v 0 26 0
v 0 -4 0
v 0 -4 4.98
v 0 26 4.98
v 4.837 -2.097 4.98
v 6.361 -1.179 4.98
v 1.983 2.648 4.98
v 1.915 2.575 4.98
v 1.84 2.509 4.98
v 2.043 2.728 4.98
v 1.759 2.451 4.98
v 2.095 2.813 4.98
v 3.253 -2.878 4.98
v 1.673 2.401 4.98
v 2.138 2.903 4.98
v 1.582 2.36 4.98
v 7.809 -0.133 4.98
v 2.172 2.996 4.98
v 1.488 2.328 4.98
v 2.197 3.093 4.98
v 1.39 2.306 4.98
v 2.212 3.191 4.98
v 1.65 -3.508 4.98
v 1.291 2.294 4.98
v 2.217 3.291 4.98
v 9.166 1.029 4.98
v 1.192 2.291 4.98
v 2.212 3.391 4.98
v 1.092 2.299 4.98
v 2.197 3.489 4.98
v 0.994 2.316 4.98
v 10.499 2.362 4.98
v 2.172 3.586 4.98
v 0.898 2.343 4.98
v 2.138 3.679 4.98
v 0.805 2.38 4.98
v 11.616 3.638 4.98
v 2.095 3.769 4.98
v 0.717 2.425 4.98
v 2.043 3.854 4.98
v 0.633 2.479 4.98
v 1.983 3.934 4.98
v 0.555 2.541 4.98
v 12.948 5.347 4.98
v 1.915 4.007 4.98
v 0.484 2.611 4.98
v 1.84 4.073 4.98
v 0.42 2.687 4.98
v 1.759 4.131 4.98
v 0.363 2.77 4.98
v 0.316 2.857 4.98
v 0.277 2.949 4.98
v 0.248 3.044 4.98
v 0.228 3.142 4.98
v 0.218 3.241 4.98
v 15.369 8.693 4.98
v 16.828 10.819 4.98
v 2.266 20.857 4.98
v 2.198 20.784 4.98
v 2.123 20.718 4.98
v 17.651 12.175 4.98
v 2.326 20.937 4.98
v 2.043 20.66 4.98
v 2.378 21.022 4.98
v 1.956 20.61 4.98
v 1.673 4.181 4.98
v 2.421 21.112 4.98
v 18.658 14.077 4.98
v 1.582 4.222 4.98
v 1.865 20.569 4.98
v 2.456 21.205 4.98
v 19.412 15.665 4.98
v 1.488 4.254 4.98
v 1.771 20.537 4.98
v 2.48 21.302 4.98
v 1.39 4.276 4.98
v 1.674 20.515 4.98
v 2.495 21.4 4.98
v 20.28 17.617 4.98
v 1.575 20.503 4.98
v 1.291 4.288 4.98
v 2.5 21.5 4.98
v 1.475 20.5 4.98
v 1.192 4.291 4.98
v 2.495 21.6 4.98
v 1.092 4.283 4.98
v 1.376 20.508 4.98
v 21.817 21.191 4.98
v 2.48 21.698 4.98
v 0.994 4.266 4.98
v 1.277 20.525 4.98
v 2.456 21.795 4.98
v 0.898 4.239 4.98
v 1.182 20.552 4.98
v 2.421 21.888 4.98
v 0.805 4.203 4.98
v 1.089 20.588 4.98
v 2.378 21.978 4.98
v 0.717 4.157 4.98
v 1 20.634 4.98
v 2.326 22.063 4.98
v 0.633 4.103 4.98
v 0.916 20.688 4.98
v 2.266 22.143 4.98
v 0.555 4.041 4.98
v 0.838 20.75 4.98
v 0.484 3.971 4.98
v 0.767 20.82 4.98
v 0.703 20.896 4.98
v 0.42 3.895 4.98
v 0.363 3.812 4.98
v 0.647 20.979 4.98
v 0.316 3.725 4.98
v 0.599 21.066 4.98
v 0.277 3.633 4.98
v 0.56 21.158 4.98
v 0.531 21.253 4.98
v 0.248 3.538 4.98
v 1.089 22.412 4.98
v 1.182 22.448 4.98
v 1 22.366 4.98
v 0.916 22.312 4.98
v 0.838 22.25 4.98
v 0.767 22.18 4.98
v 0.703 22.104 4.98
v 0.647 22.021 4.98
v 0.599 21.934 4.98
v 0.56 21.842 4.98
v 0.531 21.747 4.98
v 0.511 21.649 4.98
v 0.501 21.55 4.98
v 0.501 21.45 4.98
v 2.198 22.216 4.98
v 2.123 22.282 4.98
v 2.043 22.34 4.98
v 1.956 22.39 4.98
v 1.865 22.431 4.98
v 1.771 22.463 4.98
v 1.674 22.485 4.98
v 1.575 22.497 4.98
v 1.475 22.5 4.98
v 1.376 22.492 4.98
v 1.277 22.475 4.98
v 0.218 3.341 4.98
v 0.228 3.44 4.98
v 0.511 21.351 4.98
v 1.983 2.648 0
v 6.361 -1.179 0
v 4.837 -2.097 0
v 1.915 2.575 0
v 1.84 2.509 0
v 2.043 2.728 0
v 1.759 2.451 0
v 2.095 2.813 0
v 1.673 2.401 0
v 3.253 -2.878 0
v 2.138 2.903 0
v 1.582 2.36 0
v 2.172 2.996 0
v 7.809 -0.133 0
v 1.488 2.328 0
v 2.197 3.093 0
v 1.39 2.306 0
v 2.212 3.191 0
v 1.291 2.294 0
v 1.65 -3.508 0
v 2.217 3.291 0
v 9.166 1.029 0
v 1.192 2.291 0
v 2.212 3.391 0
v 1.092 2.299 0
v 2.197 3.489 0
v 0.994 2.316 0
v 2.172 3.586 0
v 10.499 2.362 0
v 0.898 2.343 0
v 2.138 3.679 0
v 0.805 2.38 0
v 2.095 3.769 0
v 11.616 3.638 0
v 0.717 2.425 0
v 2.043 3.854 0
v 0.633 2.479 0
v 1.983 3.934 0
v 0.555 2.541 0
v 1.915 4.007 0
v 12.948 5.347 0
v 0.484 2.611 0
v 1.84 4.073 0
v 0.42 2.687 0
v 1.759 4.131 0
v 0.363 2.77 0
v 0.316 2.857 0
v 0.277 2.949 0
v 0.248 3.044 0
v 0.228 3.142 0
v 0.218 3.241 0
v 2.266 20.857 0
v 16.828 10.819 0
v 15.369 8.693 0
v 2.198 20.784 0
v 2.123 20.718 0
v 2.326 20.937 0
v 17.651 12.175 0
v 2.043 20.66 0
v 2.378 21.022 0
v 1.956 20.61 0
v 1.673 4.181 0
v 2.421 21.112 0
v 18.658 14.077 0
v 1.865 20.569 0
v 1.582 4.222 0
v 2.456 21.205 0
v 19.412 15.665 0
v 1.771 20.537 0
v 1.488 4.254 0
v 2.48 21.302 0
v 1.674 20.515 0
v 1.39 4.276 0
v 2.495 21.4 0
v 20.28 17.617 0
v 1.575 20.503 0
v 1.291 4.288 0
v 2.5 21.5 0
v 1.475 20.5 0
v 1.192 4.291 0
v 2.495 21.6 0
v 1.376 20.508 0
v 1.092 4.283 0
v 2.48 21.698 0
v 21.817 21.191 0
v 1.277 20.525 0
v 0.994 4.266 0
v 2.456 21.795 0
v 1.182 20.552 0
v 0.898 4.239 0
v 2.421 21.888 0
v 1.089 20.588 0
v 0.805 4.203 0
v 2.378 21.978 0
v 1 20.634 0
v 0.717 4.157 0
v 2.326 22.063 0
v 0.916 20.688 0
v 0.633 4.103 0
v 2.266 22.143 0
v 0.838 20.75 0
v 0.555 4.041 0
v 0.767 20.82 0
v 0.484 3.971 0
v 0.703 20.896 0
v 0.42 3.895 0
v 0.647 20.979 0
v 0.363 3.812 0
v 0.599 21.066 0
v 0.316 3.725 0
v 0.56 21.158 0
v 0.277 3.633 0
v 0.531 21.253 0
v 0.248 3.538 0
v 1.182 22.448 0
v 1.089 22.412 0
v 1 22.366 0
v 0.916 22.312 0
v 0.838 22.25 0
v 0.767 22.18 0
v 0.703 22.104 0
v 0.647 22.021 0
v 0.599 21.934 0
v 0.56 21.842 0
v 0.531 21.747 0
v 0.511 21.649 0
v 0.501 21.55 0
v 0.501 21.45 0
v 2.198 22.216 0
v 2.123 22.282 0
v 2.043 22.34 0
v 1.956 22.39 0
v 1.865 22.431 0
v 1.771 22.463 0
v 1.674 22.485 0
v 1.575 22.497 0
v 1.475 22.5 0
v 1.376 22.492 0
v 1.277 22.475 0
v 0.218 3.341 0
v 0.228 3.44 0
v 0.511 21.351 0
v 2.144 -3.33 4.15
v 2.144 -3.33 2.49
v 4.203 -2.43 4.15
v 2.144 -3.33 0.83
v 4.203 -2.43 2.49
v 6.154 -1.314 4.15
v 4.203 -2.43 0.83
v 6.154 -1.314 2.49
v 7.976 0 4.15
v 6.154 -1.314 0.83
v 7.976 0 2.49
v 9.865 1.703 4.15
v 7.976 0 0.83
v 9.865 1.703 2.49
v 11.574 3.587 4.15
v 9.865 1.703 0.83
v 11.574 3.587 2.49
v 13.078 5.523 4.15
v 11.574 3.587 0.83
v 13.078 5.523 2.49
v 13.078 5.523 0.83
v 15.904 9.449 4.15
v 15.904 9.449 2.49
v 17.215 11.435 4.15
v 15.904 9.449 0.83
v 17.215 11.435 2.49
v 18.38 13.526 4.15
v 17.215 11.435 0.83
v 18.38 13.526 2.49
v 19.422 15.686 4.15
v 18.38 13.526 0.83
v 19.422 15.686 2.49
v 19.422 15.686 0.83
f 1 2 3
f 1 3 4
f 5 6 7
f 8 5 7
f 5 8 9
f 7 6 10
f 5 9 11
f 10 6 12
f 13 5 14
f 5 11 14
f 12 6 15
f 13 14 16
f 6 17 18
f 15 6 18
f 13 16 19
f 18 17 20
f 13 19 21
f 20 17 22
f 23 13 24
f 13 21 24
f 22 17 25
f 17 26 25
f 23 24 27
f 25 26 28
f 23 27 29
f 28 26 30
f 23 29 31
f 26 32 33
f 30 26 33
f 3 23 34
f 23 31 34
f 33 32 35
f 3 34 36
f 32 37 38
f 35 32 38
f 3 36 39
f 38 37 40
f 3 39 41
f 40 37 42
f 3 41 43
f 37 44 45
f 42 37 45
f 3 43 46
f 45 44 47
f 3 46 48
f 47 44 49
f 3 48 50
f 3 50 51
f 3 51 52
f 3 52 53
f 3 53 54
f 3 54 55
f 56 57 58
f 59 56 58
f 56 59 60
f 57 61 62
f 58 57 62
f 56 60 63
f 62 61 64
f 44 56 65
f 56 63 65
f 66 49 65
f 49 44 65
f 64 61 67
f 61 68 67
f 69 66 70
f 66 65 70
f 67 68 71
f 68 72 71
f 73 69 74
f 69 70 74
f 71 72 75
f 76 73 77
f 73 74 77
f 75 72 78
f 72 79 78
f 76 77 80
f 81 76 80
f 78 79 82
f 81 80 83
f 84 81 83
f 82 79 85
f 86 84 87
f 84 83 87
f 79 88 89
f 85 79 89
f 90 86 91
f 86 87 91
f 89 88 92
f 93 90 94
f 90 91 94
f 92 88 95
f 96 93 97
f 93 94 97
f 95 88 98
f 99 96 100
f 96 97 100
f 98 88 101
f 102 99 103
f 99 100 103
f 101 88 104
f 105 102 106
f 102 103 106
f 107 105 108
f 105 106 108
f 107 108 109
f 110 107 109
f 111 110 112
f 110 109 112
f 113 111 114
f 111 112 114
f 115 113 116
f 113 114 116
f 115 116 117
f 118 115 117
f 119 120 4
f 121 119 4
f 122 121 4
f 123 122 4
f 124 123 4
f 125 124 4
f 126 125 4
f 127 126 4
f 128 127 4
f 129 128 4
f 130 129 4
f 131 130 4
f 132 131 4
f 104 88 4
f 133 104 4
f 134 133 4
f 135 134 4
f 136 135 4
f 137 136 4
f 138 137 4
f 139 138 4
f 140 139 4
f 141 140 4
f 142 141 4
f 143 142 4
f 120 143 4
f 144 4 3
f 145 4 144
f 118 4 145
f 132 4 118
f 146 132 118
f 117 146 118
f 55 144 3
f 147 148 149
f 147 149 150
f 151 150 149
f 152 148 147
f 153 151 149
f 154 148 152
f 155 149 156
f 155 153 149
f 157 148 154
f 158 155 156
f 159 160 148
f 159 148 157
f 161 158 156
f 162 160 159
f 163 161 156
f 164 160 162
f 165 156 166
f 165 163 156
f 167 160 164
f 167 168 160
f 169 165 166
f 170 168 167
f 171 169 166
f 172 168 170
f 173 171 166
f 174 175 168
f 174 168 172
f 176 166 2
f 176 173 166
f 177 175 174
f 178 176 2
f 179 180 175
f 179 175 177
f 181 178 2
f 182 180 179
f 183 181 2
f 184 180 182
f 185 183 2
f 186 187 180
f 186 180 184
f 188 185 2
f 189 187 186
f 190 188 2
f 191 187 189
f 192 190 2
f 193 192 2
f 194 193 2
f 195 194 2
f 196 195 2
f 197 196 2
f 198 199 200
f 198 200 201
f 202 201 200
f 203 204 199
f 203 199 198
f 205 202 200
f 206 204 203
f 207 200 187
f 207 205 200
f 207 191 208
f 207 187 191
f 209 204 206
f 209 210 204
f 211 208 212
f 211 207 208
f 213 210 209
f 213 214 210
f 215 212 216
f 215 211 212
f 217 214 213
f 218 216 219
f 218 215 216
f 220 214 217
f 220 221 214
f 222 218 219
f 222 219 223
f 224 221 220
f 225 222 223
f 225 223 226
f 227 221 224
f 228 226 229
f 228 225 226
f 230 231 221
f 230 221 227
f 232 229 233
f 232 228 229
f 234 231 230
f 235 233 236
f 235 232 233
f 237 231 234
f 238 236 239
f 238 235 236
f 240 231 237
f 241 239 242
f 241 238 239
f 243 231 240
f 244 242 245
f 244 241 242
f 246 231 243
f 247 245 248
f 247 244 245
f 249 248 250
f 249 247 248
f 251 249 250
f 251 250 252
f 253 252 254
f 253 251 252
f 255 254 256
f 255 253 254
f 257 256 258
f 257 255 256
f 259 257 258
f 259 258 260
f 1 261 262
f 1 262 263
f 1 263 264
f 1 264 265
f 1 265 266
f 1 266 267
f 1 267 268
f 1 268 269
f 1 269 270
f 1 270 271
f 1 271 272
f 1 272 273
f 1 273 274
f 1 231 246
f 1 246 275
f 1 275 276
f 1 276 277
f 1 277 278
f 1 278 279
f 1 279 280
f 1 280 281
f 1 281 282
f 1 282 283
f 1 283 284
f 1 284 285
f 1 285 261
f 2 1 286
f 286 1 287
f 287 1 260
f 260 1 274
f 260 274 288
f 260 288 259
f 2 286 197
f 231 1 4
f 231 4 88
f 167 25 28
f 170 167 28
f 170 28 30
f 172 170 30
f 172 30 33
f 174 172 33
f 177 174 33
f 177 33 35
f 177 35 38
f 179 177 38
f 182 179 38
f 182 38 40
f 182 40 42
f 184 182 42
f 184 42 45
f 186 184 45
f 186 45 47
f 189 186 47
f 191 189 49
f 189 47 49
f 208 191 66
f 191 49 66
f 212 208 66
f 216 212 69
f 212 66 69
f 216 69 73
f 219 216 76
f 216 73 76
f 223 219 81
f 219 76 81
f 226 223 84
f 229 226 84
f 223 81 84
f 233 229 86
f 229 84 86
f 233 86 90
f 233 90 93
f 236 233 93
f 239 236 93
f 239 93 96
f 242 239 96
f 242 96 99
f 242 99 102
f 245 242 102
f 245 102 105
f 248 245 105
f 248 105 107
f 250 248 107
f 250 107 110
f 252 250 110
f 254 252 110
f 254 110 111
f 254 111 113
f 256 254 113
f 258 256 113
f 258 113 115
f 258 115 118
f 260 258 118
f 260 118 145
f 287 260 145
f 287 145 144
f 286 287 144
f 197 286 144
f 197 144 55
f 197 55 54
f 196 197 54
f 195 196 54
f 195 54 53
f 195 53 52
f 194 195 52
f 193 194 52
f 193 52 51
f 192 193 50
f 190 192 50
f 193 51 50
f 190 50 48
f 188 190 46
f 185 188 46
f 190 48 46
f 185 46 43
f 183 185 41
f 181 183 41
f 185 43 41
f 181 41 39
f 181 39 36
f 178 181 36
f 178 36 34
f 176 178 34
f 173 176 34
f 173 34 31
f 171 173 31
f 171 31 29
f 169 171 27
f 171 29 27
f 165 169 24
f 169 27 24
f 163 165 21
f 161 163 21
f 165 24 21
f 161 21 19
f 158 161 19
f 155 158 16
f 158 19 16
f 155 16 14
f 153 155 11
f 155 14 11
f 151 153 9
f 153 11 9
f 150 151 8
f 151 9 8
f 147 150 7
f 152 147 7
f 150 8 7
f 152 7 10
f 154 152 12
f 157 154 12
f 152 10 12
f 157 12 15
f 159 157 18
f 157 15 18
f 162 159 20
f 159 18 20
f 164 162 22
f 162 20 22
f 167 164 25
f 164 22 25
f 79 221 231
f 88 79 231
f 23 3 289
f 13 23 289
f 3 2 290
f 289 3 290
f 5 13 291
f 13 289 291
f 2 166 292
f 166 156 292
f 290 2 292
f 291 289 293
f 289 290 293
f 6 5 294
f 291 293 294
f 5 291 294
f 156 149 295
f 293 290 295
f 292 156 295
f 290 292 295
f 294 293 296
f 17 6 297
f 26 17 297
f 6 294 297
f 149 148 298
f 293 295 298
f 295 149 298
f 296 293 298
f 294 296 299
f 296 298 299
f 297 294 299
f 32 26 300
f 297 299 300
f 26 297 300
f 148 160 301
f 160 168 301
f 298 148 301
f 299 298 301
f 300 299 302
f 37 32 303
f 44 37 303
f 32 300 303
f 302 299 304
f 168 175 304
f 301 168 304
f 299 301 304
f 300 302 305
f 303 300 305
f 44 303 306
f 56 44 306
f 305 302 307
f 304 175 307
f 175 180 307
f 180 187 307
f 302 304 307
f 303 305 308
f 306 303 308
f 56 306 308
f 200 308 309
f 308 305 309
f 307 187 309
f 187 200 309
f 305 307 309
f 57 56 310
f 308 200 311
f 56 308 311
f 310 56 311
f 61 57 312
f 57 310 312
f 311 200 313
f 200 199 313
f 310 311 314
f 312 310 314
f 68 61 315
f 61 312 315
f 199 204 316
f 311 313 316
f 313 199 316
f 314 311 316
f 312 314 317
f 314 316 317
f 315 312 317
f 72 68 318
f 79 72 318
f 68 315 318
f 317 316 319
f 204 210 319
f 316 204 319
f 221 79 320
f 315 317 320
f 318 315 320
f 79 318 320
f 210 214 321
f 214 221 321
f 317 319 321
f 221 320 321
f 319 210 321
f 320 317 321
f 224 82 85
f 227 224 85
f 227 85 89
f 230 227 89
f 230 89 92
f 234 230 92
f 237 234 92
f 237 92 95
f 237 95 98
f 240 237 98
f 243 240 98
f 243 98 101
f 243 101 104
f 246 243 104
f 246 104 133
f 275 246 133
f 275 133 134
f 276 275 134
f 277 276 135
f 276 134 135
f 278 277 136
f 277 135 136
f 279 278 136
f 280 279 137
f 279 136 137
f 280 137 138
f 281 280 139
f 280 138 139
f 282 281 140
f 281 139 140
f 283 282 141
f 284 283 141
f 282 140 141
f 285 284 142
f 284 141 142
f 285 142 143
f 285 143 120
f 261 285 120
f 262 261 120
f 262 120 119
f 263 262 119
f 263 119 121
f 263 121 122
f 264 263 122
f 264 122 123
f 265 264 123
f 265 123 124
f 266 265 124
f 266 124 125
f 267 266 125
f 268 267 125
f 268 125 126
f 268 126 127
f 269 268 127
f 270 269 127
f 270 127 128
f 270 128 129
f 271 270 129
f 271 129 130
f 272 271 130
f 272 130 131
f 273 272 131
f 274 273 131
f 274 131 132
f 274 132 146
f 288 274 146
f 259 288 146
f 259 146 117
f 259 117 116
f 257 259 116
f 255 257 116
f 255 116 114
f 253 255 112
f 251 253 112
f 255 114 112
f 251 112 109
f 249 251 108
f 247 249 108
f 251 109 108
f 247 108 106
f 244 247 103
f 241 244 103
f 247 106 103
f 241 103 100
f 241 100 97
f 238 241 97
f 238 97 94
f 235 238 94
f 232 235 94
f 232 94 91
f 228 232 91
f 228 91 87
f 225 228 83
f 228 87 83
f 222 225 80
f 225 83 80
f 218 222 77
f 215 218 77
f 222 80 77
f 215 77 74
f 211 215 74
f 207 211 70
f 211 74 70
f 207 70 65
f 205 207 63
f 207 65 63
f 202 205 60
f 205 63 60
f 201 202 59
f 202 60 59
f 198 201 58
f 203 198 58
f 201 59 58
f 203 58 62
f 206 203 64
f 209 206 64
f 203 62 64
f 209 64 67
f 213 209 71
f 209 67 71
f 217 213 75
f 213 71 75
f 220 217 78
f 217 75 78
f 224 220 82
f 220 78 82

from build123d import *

# Parameters (mm, degrees)
SALIENTE_EXTRUIR1_DEPTH = 4.98
CROQUIS2_R              = 1
CORTAR_EXTRUIR1_DEPTH   = 5
CORTAR_EXTRUIR3_REACH   = 36.304
CROQUIS4_R              = 1


with BuildPart() as part:
    # Croquis1 → Saliente-Extruir1 (new body)
    with BuildSketch(Plane.XY):
        with BuildLine():
            Line((0, -4), (0, 26))
            Line((0, 26), (21.816861247, 21.191410261))
            add(Edge.make_bspline(
                [(0, -4), (2.906764931, -3.267903802), (7.189424572, -1.091865696), (11.643736623, 3.460788761), (14.473771474, 7.480841145), (17.337780125, 11.369260365), (19.648075945, 16.032903585), (21.017709919, 19.355582105), (21.816861247, 21.191410261)],
                knots=[0, 0, 0, 0, 0.260017683, 0.40718949, 0.54930604, 0.687276252, 0.826057346, 1, 1, 1, 1], degree=3))
        make_face()
    extrude(amount=SALIENTE_EXTRUIR1_DEPTH)

    # Croquis2 → Cortar-Extruir1 (cut)
    with BuildSketch(Plane.XY.offset(4.98)):
        with Locations((1.5, 21.5)):
            Circle(CROQUIS2_R)
    extrude(amount=-CORTAR_EXTRUIR1_DEPTH, mode=Mode.SUBTRACT)

    # Croquis4 → Cortar-Extruir3 (cut, up to next)
    with BuildSketch(Plane.XY.offset(4.98), mode=Mode.PRIVATE) as cortar_extruir3_sk1:
        with Locations((1.216735104, 3.291060379)):
            Circle(CROQUIS4_R)
    cortar_extruir3_tool1 = extrude(cortar_extruir3_sk1.sketch, amount=-CORTAR_EXTRUIR3_REACH, mode=Mode.PRIVATE) & part.part
    add(cortar_extruir3_tool1.solids().sort_by_distance((1.216735, 3.29106, 4.98))[0], mode=Mode.SUBTRACT)


solid = part.part
